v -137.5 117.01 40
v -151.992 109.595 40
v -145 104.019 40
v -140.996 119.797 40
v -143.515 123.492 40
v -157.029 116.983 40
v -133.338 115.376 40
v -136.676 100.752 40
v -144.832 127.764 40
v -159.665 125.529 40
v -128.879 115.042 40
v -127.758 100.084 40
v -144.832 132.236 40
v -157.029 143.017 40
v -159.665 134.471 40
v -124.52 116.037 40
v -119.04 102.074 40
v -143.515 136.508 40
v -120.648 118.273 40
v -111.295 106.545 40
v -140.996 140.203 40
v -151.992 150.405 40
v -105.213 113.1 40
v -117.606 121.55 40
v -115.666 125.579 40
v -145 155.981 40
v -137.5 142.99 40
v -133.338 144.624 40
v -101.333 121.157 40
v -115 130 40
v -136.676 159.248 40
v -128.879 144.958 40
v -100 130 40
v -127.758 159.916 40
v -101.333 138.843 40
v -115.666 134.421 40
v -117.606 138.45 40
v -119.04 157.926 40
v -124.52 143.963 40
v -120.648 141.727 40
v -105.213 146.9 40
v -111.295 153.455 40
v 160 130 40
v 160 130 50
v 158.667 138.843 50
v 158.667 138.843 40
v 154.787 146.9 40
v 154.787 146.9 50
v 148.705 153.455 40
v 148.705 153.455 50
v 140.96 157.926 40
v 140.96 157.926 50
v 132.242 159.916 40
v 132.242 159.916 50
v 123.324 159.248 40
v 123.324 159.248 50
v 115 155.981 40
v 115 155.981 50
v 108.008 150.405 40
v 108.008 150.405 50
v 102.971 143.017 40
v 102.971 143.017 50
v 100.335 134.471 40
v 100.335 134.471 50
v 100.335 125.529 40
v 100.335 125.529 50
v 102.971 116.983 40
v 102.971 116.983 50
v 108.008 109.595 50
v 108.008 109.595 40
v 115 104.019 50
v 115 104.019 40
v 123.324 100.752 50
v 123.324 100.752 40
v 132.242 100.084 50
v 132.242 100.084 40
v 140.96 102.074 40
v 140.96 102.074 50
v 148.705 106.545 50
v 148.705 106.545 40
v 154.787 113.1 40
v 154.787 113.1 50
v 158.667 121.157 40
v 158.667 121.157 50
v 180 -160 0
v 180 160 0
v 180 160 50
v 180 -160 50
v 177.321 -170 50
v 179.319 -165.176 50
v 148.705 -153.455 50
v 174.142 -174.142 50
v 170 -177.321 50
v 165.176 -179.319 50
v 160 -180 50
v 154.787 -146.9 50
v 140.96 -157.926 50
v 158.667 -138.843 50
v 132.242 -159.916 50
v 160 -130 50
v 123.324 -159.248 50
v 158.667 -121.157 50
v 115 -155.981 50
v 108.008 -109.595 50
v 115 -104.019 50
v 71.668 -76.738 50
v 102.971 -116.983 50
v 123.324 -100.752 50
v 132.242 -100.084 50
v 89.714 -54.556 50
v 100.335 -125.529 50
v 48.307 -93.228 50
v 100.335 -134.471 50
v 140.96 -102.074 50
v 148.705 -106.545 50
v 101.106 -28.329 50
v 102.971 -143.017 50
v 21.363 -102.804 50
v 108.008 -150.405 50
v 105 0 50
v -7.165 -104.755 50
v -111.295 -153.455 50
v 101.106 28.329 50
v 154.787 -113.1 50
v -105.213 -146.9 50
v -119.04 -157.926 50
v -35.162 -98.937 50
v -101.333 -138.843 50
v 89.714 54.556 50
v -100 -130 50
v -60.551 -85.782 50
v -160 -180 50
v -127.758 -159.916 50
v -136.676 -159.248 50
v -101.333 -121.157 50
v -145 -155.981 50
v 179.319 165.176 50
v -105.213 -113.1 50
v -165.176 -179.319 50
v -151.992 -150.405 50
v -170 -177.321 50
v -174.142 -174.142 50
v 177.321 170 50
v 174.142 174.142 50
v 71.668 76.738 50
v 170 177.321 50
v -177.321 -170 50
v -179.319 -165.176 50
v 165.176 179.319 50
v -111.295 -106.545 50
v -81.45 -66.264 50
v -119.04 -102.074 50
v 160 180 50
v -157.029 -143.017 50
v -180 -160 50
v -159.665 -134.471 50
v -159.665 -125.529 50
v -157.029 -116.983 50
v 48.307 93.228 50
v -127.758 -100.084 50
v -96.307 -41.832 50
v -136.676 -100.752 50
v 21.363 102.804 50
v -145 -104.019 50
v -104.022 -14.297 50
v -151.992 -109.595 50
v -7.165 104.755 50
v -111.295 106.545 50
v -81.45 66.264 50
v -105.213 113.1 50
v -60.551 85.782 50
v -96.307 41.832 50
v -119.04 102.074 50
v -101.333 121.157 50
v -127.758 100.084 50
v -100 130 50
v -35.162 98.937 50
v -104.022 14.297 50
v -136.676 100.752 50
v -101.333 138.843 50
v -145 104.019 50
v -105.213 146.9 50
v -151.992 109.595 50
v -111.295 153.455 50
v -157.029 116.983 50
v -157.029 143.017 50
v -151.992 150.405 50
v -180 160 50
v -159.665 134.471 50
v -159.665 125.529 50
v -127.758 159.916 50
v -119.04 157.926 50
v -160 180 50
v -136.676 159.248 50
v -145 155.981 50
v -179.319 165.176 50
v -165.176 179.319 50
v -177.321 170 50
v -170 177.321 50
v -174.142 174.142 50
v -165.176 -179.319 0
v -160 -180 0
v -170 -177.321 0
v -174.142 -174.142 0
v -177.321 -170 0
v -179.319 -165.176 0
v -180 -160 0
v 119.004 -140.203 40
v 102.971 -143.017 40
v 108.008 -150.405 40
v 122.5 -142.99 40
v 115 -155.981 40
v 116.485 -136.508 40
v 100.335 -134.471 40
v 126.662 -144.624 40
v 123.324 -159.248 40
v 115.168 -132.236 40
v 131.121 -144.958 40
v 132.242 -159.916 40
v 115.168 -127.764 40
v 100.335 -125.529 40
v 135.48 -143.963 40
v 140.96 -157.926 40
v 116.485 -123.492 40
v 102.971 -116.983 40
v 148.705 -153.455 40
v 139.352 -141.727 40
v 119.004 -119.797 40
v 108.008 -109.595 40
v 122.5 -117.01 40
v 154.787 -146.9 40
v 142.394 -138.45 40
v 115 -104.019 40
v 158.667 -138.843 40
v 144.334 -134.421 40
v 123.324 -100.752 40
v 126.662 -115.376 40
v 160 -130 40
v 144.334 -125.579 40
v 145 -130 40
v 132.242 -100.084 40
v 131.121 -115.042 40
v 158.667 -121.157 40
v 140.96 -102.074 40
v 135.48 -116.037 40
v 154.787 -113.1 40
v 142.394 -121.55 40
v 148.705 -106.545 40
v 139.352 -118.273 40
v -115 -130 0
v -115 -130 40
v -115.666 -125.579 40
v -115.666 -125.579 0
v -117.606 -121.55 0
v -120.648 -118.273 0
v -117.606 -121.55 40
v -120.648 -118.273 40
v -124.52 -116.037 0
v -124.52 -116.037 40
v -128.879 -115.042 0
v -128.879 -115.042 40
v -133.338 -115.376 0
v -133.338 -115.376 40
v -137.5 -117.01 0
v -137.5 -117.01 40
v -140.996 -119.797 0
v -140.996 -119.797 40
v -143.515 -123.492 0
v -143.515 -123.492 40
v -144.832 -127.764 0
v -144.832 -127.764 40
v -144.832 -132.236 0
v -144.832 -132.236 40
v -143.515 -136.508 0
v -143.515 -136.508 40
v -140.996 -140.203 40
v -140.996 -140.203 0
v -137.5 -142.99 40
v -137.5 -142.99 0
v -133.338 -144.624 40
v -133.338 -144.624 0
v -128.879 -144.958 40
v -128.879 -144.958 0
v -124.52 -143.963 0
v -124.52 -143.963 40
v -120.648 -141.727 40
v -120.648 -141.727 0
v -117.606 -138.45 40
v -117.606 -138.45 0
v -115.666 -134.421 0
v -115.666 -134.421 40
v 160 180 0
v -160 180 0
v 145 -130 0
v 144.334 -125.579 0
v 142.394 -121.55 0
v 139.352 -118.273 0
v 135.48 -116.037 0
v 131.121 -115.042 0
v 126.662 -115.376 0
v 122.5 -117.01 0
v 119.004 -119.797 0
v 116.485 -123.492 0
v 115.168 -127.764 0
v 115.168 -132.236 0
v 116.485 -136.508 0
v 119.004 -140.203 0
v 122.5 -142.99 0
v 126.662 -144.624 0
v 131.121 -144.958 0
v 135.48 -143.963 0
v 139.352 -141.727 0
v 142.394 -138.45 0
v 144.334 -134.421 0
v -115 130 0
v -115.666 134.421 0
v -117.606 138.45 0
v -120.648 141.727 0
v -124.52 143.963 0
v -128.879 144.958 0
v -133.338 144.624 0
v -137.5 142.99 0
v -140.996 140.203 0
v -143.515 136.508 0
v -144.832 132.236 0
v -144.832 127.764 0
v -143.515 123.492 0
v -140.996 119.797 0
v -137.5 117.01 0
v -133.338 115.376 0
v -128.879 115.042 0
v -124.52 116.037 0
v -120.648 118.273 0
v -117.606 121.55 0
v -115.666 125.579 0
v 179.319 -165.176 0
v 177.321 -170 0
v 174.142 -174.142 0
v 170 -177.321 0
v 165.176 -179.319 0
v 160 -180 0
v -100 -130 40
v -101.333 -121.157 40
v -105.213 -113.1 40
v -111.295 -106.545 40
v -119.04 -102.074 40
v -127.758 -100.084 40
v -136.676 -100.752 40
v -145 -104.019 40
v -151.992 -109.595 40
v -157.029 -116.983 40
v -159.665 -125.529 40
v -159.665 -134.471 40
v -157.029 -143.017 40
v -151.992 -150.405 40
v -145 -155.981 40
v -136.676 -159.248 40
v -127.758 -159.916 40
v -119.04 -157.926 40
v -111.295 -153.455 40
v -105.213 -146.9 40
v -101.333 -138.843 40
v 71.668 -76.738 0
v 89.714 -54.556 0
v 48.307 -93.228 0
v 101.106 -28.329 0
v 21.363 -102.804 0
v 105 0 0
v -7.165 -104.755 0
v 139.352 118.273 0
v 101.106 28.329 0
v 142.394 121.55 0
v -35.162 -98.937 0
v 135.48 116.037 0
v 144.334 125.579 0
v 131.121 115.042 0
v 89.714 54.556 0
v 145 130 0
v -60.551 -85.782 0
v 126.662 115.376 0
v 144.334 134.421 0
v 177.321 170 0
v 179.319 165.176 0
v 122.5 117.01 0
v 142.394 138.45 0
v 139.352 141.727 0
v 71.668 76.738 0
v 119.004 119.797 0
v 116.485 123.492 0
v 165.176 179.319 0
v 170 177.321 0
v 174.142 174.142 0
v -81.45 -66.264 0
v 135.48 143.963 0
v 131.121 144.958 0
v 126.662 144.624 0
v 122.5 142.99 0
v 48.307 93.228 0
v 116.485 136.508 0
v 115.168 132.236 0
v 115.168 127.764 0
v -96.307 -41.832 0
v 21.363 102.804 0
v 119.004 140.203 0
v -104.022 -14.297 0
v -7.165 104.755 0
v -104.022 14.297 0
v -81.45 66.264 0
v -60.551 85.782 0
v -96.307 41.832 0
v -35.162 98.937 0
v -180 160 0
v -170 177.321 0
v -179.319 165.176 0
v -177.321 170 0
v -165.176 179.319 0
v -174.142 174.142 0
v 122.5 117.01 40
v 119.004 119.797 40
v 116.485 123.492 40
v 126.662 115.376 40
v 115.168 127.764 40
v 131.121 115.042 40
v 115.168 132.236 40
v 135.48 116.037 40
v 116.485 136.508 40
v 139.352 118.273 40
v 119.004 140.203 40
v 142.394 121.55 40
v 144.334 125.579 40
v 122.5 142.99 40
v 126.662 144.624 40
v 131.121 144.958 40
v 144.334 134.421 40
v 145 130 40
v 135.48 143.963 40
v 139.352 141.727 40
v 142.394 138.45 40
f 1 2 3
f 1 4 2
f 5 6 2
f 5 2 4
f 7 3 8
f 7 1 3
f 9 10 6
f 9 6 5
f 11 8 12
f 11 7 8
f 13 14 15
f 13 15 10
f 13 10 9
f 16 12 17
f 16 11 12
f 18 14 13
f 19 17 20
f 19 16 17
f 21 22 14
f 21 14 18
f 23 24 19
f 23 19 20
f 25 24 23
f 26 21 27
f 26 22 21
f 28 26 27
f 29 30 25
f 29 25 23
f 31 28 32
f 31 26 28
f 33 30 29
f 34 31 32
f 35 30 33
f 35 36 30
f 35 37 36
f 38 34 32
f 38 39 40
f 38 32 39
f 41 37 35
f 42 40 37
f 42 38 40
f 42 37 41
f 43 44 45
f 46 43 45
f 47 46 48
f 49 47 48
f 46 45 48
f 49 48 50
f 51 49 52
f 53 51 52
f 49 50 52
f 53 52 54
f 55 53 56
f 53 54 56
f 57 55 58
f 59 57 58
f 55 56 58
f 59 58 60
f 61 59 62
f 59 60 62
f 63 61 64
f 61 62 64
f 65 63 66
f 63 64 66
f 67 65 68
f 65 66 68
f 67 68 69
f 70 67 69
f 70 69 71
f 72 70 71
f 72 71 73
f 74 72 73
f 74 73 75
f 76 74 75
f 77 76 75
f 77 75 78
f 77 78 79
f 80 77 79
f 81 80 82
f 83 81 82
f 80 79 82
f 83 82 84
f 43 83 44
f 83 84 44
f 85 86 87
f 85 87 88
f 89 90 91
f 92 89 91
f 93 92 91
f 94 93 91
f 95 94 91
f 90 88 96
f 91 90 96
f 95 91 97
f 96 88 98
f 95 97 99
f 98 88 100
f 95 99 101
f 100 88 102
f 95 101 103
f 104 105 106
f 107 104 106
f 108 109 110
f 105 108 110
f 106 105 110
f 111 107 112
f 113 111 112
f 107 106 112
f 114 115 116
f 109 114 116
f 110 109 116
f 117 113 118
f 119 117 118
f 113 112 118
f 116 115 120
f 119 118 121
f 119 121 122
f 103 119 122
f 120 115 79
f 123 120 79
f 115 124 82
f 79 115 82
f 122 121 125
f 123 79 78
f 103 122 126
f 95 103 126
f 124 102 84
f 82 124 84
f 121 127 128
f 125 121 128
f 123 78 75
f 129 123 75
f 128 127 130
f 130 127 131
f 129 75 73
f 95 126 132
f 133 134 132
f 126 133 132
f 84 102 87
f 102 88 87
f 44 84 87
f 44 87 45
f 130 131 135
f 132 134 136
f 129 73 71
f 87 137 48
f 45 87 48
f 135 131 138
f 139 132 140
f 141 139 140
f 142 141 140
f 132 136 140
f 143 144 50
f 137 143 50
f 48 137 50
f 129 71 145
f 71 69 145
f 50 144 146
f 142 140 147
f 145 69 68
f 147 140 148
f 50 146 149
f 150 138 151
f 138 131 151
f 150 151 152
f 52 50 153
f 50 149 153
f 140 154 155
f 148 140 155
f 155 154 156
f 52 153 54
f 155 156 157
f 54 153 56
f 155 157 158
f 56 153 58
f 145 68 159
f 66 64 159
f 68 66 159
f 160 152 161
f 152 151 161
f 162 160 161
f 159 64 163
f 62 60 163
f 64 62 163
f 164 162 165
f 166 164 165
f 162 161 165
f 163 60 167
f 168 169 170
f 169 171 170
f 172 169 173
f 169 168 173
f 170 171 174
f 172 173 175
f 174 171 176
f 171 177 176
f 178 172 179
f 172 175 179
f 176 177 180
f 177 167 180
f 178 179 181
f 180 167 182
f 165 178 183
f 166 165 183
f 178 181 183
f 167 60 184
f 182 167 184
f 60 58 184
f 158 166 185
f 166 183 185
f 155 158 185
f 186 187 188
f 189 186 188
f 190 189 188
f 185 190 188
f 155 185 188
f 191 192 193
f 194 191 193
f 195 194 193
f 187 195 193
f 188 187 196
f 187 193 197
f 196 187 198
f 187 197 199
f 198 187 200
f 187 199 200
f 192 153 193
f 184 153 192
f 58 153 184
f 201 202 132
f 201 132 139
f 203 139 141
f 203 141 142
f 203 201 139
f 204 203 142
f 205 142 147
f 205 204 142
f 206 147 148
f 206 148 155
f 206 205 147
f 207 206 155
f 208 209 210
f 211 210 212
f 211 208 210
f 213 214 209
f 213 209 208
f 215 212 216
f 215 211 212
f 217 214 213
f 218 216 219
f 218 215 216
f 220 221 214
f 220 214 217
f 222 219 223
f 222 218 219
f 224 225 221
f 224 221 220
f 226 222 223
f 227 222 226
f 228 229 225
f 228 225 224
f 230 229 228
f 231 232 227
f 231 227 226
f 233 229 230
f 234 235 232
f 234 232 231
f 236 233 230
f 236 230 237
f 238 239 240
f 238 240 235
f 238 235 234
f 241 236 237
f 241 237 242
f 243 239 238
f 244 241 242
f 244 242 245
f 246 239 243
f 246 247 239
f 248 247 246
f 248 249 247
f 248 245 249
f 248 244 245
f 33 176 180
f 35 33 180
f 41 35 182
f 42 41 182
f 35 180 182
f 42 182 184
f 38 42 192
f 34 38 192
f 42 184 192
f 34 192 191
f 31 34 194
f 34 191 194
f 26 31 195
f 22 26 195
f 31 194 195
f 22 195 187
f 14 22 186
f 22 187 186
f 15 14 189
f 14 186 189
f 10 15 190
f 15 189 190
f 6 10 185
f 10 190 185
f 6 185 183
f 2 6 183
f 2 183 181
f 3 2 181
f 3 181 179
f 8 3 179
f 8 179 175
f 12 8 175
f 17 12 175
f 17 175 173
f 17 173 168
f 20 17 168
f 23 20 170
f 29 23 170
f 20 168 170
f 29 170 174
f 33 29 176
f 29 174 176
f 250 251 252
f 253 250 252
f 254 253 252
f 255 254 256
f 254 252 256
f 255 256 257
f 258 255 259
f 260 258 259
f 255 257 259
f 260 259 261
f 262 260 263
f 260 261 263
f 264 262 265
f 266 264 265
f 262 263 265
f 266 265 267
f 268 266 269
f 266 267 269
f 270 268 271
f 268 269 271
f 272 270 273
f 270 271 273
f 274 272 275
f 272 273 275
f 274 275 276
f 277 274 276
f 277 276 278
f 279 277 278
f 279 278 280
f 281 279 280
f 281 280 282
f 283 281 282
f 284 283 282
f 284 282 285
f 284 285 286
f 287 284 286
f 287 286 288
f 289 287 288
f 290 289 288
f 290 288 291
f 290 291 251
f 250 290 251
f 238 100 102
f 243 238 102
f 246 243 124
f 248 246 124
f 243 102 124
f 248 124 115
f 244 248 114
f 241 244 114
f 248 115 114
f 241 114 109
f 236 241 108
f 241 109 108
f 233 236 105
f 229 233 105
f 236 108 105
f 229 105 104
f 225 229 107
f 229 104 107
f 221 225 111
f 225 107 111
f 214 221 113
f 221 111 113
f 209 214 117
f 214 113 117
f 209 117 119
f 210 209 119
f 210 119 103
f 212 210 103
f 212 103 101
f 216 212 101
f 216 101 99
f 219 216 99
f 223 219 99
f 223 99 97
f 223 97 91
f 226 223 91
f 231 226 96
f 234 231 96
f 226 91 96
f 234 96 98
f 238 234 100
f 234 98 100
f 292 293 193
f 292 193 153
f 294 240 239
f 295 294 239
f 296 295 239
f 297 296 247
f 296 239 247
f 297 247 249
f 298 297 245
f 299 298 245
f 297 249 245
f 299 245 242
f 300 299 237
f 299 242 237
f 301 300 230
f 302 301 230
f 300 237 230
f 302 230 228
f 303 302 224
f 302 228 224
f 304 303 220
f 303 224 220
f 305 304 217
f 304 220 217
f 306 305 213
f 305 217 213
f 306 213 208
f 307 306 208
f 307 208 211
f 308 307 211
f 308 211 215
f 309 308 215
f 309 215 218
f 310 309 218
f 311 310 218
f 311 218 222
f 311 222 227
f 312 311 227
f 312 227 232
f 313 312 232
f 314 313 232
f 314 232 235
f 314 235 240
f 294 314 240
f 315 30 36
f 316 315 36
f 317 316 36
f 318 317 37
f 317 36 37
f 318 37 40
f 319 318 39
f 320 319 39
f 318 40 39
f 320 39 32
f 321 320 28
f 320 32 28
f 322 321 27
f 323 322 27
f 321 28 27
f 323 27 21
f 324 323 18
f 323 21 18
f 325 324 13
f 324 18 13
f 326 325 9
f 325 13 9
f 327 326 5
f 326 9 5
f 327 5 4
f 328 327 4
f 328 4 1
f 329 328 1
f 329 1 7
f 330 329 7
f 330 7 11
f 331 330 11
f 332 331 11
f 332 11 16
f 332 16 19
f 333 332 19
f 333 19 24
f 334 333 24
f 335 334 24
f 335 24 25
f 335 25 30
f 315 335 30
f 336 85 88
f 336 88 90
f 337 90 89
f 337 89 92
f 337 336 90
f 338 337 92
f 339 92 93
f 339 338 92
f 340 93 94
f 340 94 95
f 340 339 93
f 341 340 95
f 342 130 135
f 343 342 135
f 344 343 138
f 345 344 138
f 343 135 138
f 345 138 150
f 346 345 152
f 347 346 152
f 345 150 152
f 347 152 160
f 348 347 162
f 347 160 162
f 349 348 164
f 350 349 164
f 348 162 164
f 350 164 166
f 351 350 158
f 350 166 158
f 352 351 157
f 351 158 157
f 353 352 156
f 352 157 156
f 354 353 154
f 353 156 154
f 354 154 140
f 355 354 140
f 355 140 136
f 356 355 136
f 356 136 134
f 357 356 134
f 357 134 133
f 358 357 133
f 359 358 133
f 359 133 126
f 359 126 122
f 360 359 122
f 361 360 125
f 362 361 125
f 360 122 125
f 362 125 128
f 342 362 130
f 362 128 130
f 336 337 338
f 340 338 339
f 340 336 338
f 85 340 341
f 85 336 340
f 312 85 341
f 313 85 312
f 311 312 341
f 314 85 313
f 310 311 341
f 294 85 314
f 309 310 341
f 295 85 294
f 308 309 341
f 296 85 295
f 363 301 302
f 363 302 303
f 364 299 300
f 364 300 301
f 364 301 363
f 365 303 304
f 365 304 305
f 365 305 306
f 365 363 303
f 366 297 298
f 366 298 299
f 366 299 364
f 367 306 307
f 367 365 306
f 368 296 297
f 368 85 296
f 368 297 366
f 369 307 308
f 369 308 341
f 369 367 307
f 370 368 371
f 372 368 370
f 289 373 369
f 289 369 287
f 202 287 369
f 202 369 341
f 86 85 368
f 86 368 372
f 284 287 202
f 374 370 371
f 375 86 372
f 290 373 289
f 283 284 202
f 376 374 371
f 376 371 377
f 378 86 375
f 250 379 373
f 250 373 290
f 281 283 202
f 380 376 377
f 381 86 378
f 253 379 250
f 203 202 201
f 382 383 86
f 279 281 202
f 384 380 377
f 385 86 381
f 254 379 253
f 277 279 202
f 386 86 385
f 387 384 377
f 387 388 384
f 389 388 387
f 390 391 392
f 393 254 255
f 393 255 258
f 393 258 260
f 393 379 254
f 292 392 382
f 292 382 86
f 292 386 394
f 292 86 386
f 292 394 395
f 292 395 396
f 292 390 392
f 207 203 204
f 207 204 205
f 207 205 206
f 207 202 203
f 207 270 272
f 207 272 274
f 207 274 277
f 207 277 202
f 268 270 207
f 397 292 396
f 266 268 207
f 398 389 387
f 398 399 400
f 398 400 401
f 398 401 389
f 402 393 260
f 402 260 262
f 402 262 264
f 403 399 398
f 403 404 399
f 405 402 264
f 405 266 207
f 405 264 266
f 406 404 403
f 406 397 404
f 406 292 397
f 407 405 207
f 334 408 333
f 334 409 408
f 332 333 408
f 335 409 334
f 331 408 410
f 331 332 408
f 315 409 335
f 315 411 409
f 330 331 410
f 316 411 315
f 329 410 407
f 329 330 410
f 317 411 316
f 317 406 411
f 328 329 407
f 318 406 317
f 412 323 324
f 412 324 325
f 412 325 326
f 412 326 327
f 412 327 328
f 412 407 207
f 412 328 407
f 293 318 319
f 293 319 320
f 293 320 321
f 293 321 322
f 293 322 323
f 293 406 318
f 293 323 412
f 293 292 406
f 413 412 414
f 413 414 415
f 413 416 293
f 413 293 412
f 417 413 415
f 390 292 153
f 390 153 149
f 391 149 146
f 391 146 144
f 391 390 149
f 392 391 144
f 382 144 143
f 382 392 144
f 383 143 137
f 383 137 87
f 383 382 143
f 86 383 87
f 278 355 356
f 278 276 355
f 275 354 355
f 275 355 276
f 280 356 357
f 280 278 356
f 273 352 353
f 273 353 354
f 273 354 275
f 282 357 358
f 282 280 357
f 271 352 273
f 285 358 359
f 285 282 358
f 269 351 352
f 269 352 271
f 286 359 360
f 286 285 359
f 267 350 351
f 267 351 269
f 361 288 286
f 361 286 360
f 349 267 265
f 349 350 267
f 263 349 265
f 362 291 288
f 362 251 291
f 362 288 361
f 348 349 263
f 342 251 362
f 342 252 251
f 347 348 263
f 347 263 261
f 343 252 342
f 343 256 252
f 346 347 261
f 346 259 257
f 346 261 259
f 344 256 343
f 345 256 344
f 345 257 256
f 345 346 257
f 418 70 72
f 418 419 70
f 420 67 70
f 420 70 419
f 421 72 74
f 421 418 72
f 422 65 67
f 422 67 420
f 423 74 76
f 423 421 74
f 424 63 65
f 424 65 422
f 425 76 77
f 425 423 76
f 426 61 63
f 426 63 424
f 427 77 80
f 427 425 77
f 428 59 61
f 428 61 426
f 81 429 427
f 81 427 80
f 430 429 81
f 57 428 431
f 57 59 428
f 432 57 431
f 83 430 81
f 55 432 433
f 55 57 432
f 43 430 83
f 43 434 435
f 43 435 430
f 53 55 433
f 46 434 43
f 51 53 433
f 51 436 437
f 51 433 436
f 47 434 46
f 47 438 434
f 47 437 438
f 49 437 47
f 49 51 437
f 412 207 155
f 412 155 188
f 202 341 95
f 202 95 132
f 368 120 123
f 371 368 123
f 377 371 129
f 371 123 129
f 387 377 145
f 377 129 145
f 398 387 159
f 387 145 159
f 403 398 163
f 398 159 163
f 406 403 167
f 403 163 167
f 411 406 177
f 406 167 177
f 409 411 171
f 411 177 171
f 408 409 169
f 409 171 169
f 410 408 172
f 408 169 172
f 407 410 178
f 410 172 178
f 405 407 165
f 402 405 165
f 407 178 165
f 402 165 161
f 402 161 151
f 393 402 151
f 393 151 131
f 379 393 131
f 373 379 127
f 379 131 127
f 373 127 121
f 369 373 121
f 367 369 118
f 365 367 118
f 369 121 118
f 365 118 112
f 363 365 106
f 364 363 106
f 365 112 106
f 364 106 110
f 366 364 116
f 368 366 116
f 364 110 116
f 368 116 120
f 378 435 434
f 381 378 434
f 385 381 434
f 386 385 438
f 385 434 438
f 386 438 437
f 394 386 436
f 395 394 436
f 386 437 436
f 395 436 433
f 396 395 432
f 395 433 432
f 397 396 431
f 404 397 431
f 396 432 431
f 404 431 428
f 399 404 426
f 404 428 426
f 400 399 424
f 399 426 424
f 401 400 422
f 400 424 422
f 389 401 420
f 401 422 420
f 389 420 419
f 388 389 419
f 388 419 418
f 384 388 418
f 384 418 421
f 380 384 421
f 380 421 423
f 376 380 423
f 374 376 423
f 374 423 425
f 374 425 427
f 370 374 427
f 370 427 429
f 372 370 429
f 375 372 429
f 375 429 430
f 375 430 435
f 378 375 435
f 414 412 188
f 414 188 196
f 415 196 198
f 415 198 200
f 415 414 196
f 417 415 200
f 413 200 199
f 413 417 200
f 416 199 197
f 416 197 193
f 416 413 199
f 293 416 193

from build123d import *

# Parameters (mm, degrees)
BOSS_EXTRUDE1_DEPTH = 50
SKETCH3_R           = 105
CUT_EXTRUDE1_DEPTH  = 50
SKETCH4_R           = 15
CUT_EXTRUDE3_DEPTH  = 50
SKETCH7_R           = 30
CUT_EXTRUDE4_DEPTH  = 10


with BuildPart() as part:
    # Sketch2 → Boss-Extrude1 (new body)
    with BuildSketch(Plane.XY):
        with BuildLine():
            Line((-160, 180), (160, 180))
            ThreePointArc((160, 180), (174.142135624, 174.142135624), (180, 160))
            Line((180, 160), (180, -160))
            ThreePointArc((180, -160), (174.142135624, -174.142135624), (160, -180))
            Line((160, -180), (-160, -180))
            ThreePointArc((-160, -180), (-174.142135624, -174.142135624), (-180, -160))
            Line((-180, -160), (-180, 160))
            ThreePointArc((-180, 160), (-174.142135624, 174.142135624), (-160, 180))
        make_face()
    extrude(amount=BOSS_EXTRUDE1_DEPTH)

    # Sketch3 → Cut-Extrude1 (cut)
    with BuildSketch(Plane.XY.offset(50)):
        Circle(SKETCH3_R)
    extrude(amount=-CUT_EXTRUDE1_DEPTH, mode=Mode.SUBTRACT)

    # Sketch4 → Cut-Extrude3 (cut)
    with BuildSketch(Plane.XY.offset(50)):
        with Locations((-130, 130)):
            Circle(SKETCH4_R)
        with Locations((-130, -130)):
            Circle(SKETCH4_R)
        with Locations((130, -130)):
            Circle(SKETCH4_R)
        with Locations((130, 130)):
            Circle(SKETCH4_R)
    extrude(amount=-CUT_EXTRUDE3_DEPTH, mode=Mode.SUBTRACT)

    # Sketch7 → Cut-Extrude4 (cut)
    with BuildSketch(Plane.XY.offset(50)):
        with Locations((-130, 130)):
            Circle(SKETCH7_R)
        with Locations((130, 130)):
            Circle(SKETCH7_R)
        with Locations((130, -130)):
            Circle(SKETCH7_R)
        with Locations((-130, -130)):
            Circle(SKETCH7_R)
    extrude(amount=-CUT_EXTRUDE4_DEPTH, mode=Mode.SUBTRACT)


solid = part.part
